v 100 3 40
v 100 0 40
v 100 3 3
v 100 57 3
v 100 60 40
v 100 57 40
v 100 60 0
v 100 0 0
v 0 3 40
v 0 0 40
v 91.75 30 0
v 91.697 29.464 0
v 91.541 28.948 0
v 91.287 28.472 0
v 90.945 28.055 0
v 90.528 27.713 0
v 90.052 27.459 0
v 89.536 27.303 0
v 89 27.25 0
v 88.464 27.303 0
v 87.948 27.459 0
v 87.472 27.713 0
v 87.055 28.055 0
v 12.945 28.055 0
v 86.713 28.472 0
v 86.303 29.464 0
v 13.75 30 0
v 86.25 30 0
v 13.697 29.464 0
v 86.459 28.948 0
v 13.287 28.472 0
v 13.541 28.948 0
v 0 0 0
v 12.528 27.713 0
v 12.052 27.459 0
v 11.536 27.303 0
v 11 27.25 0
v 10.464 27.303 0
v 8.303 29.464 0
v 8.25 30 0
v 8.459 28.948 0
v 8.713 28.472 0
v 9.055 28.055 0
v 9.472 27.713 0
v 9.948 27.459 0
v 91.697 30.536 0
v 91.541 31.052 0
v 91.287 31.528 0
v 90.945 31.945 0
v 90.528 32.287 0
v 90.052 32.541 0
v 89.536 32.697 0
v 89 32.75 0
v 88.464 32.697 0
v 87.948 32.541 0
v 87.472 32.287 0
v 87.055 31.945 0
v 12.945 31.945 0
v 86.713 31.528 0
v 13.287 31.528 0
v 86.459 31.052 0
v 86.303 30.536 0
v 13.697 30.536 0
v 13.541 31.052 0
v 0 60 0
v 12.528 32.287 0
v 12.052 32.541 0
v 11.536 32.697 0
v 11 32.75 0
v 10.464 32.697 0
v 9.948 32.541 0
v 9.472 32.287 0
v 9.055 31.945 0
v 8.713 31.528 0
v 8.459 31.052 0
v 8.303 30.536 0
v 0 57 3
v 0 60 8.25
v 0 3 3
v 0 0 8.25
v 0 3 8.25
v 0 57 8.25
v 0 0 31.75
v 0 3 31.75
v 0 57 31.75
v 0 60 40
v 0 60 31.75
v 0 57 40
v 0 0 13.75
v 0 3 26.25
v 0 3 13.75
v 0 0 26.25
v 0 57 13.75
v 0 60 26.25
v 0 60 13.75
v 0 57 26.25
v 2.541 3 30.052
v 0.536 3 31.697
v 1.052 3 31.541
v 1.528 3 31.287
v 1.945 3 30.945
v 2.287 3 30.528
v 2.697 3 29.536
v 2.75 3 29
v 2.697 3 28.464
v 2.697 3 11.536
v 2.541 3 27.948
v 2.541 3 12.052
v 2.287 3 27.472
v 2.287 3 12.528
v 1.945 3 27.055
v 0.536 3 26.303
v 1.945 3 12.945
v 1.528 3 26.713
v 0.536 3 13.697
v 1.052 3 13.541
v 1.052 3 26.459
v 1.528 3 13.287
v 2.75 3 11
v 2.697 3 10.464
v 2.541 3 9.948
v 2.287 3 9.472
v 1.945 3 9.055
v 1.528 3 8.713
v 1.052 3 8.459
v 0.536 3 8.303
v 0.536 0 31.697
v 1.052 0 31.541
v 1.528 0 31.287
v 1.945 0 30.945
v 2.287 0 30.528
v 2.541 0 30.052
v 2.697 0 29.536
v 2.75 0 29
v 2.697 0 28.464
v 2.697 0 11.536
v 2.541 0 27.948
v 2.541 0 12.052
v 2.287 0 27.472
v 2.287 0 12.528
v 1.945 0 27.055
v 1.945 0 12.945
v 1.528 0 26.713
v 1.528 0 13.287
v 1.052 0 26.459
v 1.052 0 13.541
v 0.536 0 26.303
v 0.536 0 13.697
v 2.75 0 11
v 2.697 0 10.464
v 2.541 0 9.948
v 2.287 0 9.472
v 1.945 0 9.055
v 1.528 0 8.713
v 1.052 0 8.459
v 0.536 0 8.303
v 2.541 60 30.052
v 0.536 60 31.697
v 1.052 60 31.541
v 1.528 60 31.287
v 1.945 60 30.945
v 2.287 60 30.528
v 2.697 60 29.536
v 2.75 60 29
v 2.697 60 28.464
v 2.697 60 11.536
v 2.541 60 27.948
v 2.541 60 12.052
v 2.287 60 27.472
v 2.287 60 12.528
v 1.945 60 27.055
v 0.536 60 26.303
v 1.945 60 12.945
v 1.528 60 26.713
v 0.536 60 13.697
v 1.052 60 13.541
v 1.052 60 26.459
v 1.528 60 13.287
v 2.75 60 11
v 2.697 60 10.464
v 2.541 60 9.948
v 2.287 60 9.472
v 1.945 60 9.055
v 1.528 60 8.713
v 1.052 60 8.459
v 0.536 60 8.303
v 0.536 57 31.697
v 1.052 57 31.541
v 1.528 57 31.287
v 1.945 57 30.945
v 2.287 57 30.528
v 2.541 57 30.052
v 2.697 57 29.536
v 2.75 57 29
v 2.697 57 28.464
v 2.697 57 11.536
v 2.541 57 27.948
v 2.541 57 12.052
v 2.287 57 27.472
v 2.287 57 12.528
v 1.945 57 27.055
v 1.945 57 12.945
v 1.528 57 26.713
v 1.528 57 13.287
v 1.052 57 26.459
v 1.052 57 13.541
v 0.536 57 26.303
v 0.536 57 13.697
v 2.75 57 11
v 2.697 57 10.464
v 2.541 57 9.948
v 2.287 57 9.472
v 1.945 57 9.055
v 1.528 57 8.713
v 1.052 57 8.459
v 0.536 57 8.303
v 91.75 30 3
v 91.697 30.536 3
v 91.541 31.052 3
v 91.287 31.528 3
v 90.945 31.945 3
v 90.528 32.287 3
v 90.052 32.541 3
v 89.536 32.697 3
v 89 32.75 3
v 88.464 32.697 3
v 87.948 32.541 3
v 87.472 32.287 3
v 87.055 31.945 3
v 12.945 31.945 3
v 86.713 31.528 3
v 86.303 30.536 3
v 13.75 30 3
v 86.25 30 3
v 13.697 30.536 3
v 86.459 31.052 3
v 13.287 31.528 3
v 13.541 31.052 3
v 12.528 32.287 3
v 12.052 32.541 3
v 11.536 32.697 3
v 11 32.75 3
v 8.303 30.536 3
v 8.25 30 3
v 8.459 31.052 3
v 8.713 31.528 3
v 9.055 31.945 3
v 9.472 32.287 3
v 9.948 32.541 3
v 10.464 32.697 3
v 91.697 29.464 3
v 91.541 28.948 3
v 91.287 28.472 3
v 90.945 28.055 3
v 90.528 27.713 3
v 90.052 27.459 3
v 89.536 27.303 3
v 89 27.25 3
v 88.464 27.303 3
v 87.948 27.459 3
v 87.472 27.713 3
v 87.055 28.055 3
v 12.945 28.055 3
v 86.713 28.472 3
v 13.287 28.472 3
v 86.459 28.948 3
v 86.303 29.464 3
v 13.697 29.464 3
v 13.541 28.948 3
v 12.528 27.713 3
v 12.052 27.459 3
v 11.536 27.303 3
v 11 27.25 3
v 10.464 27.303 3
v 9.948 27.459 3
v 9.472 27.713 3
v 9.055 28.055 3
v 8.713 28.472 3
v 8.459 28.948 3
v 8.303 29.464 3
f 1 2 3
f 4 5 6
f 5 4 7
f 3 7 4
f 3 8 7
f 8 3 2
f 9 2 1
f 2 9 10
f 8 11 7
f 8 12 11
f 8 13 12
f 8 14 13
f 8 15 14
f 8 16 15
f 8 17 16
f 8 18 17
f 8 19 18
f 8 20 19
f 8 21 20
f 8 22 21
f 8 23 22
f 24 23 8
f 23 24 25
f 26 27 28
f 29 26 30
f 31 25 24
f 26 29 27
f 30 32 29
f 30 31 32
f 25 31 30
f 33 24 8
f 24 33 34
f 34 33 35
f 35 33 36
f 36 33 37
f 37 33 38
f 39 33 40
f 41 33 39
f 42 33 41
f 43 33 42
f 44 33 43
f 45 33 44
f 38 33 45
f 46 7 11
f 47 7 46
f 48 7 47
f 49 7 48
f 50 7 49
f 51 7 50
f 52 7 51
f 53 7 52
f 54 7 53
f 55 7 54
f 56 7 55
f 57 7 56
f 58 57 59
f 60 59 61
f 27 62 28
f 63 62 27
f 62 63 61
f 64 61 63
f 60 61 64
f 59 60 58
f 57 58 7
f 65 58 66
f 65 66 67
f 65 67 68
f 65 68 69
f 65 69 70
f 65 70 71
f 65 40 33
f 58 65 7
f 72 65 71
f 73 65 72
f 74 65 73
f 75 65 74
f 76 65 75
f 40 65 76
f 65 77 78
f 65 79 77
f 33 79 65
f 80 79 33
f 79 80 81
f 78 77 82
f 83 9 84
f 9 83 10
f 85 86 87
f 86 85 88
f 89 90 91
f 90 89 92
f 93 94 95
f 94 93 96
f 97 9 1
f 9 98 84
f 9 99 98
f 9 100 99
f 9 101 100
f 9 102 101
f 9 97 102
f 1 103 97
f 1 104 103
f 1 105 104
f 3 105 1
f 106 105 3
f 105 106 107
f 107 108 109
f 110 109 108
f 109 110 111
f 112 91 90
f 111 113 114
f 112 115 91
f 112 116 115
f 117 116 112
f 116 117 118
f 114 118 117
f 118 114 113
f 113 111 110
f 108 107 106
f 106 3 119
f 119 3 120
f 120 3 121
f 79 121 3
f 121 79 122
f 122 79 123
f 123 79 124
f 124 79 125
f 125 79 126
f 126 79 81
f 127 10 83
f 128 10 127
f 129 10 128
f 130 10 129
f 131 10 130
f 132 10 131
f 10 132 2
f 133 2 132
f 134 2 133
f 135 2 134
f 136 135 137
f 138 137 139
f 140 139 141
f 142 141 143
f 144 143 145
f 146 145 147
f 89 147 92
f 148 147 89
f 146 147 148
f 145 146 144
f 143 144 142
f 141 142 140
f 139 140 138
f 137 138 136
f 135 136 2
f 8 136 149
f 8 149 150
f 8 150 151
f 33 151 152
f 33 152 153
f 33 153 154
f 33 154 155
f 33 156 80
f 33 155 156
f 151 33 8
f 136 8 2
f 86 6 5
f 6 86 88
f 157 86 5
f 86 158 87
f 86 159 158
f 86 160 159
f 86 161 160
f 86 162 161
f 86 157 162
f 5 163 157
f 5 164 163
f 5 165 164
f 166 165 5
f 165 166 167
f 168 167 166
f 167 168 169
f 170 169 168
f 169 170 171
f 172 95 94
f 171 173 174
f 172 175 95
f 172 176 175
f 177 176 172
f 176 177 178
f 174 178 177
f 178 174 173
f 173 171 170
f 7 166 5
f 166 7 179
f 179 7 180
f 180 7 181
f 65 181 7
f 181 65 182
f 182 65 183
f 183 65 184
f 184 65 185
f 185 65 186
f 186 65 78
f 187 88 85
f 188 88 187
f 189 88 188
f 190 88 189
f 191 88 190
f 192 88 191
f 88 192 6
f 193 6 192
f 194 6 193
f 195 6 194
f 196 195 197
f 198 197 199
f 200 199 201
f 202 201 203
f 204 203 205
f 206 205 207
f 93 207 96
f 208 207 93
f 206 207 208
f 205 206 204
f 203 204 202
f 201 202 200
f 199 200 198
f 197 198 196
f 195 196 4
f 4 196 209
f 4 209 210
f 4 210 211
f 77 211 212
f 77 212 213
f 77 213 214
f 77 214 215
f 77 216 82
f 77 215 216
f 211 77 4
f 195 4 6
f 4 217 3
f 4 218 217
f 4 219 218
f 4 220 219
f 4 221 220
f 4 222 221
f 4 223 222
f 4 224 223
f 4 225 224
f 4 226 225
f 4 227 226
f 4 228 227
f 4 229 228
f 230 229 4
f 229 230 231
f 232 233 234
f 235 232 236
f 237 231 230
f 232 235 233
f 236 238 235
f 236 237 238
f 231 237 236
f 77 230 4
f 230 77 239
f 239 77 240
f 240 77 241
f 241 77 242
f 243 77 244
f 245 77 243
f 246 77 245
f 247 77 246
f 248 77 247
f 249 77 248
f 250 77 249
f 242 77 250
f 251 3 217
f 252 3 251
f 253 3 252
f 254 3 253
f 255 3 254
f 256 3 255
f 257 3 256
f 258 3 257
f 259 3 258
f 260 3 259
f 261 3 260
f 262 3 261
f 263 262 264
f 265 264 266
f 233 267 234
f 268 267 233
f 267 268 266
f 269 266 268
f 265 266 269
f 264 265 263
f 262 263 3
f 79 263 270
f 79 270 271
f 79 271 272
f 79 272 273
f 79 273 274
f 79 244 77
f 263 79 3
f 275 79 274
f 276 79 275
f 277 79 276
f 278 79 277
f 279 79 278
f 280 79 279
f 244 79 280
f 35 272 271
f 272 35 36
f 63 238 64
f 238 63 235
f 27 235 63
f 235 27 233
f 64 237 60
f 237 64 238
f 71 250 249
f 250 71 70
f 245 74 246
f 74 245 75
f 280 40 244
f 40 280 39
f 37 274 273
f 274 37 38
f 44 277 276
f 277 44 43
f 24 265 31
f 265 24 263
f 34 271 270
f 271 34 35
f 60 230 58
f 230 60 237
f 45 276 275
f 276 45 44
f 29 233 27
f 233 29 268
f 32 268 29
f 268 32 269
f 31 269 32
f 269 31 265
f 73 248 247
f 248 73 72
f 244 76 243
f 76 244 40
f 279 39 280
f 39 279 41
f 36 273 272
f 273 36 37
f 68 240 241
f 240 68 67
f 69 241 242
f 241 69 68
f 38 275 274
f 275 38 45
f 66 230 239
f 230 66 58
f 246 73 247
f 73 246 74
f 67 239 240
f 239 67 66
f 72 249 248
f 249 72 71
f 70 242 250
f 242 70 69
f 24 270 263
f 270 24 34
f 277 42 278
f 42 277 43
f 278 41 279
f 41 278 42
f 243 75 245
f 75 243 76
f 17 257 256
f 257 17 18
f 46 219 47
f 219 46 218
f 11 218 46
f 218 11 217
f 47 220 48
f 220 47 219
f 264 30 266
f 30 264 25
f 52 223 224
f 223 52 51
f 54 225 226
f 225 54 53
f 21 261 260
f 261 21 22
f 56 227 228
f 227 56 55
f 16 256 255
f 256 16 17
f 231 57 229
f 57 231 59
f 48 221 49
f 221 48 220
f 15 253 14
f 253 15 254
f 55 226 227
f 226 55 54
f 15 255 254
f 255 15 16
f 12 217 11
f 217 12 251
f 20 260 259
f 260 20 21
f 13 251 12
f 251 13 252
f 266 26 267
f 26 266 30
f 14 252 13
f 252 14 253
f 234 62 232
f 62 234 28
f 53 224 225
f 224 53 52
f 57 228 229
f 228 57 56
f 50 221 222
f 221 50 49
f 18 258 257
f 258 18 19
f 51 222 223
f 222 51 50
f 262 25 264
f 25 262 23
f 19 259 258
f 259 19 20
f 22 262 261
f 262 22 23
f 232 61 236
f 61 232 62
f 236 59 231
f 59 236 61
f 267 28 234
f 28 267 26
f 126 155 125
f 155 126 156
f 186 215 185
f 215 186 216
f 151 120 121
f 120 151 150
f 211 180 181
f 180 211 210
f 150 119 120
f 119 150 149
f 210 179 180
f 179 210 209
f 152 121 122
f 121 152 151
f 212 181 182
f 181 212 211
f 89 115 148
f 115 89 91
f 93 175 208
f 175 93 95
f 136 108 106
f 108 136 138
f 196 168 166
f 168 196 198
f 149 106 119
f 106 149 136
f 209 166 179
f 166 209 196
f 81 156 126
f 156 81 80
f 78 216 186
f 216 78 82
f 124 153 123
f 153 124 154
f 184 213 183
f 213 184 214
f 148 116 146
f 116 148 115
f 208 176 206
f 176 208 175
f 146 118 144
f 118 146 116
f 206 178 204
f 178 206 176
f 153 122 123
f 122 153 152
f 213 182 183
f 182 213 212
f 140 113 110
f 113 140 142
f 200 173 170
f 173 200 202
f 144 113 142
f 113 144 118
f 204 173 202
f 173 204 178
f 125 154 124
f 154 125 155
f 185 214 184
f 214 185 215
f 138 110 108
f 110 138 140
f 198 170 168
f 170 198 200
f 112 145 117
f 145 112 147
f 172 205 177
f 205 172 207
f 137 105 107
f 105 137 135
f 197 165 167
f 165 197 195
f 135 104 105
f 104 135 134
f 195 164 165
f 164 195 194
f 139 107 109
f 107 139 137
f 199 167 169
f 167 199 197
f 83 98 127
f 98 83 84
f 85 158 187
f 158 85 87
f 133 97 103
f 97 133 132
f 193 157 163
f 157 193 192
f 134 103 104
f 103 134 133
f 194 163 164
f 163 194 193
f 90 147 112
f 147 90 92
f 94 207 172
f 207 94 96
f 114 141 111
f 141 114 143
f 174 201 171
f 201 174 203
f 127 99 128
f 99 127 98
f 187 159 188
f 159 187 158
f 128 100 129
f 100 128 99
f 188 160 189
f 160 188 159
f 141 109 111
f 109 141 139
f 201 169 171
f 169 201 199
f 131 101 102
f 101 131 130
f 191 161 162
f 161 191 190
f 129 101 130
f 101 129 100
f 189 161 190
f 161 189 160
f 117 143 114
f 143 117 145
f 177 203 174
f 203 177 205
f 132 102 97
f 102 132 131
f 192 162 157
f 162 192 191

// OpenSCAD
$fn = 32;

// ----------------------------------------------------------------------
// U-bracket: 100 x 60 x 40 mm
// ----------------------------------------------------------------------

// --- parameters (mm) ---
base_len = 100;           // outer length, X
channel_w = 60;           // outer width, Y
upright_h = 40;           // upright height, Z
mat_t = 3;                // wall thickness
hole_d = 5.5;             // clearance for M5

module hole_z(px, py) {
  translate([px, py, -2.5]) cylinder(h = mat_t + 5, d = hole_d);
}
module hole_y_pz(pz) {
  /* through both uprights along Y */
  translate([0, -2.5, pz]) rotate([-90, 0, 0]) cylinder(h = channel_w + 5, d = hole_d);
}

module base() {
  cube([base_len, channel_w, mat_t]);
}

module uprights() {
  cube([base_len, mat_t, upright_h]);
  translate([0, channel_w - mat_t, 0]) cube([base_len, mat_t, upright_h]);
}

difference() {
  union() {
    base();
    uprights();
  }
  hole_z(11, 30);
  hole_z(89, 30);
  hole_y_pz(11);
  hole_y_pz(29);
}
